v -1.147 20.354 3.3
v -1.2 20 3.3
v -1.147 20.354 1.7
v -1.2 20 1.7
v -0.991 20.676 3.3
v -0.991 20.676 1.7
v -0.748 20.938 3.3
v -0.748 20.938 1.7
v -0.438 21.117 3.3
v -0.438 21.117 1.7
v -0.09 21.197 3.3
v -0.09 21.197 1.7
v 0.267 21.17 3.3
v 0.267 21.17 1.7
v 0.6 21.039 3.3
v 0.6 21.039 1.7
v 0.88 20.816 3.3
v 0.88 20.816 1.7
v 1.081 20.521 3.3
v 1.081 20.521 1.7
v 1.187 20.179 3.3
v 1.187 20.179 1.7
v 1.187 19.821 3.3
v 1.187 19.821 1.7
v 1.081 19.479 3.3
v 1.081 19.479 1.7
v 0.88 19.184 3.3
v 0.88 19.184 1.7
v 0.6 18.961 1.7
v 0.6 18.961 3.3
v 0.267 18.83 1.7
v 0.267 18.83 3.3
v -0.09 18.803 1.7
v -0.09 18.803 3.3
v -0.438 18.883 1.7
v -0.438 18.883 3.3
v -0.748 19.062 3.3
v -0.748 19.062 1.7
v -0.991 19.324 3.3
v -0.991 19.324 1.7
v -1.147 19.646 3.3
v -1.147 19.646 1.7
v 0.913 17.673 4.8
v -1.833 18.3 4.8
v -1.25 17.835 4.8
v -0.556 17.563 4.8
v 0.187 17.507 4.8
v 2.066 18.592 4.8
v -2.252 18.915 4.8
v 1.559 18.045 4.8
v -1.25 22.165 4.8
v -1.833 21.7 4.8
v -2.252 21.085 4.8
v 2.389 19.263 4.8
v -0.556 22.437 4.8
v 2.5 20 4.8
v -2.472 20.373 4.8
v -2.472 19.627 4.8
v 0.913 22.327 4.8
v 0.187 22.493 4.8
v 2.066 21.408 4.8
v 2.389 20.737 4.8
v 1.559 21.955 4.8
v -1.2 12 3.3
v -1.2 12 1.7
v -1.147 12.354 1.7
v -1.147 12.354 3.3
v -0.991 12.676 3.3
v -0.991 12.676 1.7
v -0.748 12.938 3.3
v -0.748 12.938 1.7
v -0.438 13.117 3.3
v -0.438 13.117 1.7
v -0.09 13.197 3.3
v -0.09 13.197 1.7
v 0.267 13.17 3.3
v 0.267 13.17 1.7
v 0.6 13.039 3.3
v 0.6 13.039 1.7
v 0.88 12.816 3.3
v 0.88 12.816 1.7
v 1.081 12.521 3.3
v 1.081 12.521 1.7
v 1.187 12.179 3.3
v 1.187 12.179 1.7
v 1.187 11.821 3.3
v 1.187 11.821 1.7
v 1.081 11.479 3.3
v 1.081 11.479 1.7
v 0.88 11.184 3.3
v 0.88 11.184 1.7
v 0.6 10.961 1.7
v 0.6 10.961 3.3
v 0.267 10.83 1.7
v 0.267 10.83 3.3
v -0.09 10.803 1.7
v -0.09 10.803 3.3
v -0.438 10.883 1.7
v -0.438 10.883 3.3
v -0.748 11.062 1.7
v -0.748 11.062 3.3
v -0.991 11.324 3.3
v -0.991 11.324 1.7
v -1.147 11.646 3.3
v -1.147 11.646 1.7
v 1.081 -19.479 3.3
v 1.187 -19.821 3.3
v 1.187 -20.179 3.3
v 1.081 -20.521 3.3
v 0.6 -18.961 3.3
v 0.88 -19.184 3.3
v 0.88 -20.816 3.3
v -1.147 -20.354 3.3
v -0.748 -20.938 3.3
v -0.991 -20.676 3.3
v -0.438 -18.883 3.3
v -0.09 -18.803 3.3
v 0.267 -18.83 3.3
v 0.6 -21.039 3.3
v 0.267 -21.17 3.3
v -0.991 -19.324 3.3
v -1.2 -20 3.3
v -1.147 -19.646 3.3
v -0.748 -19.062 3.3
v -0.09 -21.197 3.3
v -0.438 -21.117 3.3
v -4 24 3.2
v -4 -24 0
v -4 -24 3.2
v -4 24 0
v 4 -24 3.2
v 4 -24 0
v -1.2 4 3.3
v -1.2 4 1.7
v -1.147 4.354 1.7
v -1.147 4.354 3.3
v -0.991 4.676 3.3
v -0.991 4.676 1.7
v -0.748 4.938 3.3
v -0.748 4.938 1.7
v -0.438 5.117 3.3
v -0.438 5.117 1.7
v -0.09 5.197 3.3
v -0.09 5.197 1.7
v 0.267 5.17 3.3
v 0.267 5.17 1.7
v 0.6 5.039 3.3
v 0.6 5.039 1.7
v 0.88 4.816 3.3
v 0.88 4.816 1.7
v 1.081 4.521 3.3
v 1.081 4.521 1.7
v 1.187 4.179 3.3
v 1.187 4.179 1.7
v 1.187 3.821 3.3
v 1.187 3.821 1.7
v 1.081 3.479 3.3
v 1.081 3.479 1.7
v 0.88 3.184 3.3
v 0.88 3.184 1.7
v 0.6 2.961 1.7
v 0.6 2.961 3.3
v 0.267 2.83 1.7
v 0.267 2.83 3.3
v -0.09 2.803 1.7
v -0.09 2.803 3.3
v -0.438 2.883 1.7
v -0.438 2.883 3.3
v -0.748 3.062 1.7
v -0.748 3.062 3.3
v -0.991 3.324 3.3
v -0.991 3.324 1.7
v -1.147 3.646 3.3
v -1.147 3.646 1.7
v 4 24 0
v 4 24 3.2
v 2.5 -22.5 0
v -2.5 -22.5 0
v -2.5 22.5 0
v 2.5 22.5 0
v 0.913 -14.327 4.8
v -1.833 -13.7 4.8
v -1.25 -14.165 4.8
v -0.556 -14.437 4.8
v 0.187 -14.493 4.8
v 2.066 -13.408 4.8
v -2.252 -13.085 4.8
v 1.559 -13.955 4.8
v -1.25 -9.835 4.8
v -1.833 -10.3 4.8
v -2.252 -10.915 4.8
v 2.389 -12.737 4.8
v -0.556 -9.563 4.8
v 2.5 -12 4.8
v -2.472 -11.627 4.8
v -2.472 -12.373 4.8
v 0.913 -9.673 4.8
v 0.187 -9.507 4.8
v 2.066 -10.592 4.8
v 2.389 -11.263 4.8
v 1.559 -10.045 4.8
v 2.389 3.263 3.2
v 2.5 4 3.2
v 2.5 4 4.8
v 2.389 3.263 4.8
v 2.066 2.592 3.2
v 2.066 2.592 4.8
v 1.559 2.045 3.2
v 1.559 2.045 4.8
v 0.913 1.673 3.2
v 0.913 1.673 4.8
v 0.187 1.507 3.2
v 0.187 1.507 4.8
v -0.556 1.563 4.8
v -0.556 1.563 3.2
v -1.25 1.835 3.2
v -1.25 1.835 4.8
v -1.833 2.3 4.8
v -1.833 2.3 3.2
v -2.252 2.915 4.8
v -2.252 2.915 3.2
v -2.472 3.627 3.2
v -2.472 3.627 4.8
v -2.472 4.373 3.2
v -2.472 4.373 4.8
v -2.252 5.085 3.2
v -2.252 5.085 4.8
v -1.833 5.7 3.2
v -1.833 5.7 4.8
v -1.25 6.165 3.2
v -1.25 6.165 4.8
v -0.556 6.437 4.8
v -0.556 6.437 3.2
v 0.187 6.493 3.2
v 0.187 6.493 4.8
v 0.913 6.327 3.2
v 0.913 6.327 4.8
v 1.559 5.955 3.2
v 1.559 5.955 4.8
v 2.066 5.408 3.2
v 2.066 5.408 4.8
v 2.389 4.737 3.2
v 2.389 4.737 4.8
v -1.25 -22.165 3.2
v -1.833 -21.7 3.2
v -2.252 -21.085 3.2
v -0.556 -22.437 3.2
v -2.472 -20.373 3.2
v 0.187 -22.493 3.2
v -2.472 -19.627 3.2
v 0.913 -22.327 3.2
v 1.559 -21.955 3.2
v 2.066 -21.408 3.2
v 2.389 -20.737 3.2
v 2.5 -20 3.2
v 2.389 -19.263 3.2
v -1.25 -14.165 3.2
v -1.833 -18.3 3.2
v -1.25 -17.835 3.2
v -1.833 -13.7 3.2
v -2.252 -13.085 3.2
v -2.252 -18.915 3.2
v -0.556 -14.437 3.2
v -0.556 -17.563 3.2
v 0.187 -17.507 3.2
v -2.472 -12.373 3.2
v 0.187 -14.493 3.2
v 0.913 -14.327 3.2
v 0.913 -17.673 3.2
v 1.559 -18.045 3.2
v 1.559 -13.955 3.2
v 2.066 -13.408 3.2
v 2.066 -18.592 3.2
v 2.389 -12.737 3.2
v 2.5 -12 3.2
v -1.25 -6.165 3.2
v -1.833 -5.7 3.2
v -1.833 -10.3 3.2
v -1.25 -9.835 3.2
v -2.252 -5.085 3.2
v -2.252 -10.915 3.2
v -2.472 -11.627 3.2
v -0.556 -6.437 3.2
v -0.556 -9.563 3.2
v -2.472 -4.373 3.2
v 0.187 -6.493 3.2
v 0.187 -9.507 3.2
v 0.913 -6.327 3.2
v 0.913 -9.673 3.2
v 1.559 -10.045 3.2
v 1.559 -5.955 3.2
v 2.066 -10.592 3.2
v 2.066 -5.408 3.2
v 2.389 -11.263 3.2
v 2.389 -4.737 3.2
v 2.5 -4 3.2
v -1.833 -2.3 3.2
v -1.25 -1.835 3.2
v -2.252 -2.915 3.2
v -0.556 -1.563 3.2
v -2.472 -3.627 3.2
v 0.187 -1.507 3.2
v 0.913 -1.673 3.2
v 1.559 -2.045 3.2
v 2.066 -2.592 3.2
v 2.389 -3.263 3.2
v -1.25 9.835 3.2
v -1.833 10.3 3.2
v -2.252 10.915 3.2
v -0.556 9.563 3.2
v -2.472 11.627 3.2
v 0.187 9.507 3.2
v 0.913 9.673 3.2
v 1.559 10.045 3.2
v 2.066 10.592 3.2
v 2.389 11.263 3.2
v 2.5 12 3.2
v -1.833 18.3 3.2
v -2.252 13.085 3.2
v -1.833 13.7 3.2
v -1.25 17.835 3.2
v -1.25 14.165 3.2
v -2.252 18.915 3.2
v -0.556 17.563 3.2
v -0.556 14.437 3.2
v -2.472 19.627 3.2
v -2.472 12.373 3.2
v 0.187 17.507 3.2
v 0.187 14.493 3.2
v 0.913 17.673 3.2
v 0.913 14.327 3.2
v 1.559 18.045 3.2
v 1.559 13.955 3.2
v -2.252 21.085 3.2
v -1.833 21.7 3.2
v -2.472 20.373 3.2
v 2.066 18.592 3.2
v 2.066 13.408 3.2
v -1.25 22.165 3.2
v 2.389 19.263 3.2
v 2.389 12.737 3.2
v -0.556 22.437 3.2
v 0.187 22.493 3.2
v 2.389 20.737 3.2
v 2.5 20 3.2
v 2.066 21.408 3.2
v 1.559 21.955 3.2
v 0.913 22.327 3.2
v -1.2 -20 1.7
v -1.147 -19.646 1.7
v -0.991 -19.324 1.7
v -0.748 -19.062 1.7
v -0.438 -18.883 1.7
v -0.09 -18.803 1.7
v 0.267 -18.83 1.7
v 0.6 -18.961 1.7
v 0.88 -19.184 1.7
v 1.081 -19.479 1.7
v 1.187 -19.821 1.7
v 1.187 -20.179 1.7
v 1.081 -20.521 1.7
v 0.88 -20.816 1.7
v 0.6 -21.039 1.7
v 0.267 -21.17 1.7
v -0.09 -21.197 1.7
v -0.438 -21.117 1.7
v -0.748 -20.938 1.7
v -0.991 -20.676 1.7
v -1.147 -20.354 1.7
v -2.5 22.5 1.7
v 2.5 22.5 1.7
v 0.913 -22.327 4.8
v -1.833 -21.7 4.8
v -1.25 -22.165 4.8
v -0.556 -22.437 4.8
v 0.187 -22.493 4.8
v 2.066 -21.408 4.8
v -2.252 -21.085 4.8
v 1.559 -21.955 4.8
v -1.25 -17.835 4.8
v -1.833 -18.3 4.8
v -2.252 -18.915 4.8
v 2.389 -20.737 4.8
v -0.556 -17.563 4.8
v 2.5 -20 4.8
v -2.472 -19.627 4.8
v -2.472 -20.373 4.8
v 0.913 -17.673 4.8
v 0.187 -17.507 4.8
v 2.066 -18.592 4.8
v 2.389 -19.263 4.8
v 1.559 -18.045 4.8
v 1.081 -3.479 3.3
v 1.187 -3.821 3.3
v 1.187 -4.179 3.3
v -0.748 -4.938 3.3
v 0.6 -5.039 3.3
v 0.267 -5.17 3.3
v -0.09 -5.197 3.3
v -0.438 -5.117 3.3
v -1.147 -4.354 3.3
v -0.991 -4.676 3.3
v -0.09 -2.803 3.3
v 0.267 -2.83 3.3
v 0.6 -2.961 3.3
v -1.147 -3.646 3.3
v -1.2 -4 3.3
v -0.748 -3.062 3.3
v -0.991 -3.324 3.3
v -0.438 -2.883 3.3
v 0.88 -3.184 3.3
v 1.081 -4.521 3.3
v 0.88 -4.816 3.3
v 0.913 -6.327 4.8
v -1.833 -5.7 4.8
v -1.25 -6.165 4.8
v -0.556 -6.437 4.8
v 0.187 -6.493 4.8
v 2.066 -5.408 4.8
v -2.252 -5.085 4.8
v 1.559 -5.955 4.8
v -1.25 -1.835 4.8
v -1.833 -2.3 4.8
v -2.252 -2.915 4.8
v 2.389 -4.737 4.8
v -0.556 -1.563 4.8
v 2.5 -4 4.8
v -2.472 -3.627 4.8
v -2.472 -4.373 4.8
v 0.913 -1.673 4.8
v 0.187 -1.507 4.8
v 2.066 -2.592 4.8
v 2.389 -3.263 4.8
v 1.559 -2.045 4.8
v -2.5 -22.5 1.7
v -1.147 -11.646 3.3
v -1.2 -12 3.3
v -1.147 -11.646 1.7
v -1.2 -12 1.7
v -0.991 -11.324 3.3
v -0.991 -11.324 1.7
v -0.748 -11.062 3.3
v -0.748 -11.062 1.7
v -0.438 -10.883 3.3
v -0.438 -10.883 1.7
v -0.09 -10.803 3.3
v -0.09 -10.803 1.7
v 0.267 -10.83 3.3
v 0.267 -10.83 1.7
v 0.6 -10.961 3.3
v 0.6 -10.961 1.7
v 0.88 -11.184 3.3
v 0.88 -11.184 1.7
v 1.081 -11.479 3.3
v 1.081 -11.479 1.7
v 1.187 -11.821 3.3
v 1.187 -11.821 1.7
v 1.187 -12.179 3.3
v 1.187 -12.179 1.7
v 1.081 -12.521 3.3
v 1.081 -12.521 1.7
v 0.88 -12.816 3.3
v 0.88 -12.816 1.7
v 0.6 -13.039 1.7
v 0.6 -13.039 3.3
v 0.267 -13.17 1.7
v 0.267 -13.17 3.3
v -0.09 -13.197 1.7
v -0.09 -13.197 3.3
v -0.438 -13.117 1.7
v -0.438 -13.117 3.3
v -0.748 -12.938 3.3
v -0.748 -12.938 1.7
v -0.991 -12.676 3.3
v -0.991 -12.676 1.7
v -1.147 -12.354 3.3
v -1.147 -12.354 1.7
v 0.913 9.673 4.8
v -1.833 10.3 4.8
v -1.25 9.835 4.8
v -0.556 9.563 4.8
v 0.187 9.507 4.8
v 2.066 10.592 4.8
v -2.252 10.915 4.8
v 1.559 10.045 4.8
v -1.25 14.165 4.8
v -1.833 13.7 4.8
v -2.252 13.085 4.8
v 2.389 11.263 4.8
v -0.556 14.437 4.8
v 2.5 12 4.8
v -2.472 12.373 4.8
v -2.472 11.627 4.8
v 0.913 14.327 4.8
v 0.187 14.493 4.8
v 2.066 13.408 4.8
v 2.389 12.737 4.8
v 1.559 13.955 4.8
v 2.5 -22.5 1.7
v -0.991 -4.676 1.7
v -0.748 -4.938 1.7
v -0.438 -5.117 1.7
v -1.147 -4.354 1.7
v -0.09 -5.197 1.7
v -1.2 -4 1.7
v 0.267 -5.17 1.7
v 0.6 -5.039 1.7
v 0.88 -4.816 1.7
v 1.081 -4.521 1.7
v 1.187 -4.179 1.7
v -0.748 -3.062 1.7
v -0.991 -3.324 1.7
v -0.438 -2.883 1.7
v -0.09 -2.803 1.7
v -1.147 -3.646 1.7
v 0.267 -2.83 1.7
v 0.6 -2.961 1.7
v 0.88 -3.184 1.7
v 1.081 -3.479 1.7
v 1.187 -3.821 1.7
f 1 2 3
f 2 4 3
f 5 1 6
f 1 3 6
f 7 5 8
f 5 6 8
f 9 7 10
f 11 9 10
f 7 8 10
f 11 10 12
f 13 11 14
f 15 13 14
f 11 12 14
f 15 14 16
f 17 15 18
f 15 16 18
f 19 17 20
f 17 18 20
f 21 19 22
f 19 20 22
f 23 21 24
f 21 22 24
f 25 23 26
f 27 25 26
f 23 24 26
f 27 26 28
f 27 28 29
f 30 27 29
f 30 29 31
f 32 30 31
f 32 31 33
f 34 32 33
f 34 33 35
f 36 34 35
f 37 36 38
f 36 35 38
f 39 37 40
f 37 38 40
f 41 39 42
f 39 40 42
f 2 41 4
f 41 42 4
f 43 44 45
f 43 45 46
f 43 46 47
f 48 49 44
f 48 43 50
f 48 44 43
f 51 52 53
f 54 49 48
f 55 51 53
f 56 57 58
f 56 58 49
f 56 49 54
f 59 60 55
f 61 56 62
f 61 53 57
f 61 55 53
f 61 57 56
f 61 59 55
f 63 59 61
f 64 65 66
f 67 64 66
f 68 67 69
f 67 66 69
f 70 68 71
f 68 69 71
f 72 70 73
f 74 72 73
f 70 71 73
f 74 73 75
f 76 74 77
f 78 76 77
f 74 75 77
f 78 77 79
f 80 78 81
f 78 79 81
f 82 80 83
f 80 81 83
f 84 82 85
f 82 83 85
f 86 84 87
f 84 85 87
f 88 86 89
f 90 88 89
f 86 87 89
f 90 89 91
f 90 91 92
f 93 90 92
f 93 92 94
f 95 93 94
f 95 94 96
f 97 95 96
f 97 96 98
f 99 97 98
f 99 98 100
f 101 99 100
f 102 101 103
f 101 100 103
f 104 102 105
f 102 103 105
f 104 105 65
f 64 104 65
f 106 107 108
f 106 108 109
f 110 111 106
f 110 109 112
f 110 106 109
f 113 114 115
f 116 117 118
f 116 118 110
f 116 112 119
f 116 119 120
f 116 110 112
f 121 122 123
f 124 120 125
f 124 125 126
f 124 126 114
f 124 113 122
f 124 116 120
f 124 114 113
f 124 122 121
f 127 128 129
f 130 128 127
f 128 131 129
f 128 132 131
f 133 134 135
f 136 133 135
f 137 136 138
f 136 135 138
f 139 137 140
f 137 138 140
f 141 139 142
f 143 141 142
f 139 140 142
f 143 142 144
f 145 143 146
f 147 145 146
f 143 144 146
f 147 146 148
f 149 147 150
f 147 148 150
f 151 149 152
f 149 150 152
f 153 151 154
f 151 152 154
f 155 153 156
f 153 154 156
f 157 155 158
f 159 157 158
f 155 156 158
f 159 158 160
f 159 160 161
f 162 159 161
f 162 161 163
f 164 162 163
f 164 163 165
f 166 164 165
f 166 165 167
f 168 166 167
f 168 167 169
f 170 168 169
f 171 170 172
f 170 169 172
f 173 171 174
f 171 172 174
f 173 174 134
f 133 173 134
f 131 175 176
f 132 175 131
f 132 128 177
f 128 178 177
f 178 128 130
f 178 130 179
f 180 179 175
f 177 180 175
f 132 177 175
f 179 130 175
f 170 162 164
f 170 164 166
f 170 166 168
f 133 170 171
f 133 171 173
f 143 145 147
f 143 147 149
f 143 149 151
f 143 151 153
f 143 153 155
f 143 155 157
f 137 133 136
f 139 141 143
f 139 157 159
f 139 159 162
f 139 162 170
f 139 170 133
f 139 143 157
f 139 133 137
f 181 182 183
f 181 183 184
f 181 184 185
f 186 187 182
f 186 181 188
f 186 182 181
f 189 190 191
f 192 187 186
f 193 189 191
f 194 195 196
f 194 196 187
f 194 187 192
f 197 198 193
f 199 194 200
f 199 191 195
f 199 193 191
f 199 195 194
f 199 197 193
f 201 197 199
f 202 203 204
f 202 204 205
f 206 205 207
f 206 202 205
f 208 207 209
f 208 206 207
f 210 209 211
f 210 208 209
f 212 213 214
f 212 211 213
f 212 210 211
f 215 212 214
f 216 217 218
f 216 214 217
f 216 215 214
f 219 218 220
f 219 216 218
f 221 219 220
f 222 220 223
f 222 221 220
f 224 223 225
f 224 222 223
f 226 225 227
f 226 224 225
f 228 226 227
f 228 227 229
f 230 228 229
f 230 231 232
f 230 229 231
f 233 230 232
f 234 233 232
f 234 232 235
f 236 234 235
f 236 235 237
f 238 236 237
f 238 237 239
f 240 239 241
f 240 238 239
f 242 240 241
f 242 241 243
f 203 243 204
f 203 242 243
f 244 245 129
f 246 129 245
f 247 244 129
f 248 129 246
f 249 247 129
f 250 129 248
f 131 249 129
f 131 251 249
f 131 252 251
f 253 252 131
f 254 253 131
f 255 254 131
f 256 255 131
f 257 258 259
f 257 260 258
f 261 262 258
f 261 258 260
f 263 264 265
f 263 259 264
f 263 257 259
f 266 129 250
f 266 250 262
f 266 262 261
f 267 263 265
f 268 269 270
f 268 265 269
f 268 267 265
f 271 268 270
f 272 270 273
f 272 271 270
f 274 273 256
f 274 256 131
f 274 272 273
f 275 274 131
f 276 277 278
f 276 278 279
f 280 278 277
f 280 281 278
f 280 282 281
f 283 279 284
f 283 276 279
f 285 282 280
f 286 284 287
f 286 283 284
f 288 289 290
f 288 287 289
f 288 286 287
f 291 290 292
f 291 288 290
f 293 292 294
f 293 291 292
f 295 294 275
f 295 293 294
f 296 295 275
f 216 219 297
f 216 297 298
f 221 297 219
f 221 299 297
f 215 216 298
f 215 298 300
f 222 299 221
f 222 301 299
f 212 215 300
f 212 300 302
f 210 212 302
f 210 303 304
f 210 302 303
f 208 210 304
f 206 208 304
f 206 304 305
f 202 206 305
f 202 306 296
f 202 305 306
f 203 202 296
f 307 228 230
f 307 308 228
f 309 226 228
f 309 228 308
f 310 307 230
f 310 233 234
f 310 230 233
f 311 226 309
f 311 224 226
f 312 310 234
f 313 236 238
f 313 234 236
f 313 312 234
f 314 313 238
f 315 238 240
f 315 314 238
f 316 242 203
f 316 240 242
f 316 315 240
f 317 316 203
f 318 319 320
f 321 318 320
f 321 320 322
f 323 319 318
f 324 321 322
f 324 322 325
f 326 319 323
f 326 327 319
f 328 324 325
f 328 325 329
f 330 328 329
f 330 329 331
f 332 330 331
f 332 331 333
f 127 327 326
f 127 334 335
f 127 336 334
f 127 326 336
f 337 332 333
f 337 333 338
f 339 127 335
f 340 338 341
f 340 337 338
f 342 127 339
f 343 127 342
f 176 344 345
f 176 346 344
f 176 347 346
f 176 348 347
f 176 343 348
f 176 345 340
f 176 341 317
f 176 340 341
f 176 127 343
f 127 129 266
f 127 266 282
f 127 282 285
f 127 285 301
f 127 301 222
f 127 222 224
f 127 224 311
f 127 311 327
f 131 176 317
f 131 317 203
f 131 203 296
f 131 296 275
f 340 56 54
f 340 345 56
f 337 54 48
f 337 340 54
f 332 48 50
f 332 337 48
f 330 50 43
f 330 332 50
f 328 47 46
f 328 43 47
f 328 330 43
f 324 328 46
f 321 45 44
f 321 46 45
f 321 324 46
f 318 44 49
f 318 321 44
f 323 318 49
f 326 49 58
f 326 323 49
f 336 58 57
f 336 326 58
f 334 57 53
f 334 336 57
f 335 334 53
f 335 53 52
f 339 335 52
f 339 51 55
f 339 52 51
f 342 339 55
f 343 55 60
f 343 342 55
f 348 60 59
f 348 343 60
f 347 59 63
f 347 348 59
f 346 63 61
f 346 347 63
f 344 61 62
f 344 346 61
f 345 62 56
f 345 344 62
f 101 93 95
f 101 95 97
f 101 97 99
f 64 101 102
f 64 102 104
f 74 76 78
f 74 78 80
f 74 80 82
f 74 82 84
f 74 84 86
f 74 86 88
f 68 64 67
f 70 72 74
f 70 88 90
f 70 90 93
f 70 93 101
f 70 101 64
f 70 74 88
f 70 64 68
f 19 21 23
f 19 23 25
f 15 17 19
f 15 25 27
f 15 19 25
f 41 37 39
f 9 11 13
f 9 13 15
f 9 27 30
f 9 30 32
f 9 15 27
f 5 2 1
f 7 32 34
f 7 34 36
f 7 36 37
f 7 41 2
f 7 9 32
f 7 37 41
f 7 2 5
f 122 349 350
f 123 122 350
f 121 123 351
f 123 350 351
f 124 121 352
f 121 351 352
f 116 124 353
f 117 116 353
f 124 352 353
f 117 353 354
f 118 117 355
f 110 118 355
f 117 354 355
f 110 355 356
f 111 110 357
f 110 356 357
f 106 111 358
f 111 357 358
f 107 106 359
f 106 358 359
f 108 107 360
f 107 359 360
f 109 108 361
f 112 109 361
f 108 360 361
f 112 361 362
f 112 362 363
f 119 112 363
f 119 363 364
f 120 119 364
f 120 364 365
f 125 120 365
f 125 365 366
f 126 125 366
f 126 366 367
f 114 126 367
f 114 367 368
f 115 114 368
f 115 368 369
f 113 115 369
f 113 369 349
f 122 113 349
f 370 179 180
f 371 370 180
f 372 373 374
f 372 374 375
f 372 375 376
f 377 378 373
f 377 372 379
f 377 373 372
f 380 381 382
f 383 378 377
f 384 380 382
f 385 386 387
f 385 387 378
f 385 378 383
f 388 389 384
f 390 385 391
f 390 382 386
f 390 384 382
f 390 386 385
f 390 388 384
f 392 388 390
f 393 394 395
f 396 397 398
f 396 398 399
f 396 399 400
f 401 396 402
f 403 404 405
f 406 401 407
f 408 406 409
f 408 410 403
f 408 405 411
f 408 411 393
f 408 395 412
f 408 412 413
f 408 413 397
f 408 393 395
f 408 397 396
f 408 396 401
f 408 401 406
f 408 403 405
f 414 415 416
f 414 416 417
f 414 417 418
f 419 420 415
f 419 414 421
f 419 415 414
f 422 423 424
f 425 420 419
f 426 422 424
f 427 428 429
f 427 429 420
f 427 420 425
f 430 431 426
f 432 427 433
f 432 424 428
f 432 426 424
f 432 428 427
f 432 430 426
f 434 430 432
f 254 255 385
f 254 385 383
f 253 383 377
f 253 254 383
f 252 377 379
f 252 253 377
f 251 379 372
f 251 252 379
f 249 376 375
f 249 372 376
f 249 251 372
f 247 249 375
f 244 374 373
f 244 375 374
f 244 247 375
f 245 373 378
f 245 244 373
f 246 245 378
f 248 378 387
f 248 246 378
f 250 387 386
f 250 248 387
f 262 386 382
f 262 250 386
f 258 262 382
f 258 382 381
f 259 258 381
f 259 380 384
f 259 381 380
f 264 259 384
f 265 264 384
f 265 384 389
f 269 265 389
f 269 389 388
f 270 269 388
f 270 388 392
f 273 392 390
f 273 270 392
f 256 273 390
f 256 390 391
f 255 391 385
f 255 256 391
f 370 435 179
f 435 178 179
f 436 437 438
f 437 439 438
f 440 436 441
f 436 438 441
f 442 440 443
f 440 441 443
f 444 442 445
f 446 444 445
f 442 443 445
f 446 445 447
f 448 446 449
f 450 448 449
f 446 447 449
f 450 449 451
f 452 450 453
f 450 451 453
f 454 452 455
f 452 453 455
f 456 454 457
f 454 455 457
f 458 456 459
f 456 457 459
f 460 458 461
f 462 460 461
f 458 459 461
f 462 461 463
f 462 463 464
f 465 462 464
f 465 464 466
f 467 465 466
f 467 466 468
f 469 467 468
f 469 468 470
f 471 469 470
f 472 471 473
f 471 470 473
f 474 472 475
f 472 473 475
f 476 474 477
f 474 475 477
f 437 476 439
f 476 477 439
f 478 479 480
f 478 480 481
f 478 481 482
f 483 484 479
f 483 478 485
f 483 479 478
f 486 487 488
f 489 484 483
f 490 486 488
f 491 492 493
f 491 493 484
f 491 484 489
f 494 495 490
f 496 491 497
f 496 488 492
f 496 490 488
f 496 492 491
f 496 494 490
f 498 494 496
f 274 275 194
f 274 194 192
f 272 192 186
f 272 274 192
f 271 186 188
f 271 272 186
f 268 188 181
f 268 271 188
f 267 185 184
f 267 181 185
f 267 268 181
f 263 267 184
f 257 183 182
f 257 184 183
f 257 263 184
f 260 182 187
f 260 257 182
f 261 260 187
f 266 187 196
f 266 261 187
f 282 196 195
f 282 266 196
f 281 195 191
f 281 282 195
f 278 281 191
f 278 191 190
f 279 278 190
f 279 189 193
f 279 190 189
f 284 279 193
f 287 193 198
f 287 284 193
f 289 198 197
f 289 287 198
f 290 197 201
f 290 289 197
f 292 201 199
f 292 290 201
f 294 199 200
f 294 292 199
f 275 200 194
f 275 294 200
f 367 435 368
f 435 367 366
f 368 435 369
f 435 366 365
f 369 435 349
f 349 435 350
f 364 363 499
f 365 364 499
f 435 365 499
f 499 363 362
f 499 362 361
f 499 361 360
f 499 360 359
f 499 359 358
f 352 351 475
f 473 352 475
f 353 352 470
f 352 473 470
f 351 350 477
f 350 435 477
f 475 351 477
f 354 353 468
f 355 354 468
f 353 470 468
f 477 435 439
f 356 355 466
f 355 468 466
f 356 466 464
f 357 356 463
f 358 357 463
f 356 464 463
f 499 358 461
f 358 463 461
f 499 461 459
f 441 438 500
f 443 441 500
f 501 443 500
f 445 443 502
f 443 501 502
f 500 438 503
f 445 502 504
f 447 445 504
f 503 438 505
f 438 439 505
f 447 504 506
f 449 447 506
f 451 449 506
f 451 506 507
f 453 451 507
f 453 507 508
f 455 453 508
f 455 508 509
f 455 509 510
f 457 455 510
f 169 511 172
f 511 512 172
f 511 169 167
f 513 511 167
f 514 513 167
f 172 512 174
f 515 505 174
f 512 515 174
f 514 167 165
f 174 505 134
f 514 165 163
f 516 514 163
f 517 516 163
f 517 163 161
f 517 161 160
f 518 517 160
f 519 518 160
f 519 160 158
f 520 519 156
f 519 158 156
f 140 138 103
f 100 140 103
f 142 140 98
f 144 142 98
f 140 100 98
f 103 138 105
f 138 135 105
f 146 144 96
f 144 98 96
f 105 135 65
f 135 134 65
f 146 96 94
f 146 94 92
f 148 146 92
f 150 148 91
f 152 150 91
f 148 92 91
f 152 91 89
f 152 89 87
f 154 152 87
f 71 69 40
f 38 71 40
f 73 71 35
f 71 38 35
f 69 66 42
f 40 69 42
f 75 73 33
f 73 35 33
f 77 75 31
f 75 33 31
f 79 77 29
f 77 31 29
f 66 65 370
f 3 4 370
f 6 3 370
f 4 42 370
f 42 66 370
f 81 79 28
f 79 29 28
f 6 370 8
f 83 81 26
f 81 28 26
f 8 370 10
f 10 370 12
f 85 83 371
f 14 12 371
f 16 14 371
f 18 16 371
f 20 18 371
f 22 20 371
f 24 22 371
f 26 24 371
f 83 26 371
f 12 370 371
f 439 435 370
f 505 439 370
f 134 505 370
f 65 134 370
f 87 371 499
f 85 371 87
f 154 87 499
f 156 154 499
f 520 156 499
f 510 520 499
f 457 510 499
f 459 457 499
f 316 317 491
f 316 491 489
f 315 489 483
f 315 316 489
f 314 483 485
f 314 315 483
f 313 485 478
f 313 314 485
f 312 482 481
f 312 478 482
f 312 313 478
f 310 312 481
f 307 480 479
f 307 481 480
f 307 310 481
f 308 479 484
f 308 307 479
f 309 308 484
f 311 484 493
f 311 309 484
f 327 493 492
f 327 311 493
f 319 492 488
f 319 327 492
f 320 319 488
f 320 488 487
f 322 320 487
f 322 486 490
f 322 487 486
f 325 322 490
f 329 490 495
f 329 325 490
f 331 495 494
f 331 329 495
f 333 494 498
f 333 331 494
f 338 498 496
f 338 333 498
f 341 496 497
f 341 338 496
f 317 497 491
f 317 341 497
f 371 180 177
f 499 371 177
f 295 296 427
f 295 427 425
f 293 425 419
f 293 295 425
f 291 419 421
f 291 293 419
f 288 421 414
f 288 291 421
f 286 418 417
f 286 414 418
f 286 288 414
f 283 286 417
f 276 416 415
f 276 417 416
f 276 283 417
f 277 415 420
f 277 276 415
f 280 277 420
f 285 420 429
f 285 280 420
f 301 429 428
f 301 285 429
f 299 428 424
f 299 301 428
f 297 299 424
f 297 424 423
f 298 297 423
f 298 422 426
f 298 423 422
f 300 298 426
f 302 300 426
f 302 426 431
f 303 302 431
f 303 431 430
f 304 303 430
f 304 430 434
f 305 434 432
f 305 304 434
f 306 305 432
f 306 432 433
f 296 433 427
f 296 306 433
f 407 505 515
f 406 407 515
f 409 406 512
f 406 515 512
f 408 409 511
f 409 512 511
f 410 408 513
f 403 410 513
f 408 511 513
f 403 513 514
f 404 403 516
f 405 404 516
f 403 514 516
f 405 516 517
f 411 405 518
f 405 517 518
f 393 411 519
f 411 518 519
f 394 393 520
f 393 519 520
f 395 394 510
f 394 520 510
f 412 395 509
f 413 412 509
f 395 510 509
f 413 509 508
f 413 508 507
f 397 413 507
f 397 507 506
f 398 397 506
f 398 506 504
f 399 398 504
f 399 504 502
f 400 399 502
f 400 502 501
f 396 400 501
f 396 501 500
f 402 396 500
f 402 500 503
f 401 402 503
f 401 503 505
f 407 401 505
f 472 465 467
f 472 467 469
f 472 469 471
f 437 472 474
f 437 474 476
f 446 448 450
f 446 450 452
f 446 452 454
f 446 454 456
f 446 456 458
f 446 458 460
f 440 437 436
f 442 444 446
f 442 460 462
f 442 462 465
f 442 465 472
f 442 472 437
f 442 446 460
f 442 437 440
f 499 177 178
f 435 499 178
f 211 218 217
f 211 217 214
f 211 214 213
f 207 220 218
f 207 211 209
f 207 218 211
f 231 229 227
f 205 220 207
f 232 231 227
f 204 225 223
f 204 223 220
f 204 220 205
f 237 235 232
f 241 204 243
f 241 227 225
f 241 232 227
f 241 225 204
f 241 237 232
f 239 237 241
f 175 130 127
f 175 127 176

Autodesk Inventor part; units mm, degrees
ref_plane "YZ Plane" through (0, 0, 0) normal (1, 0, 0) x (0, 1, 0)
ref_plane "XZ Plane" through (0, 0, 0) normal (0, 1, 0) x (-1, 0, 0)
ref_plane "XY Plane" through (0, 0, 0) normal (0, 0, 1) x (1, 0, 0)
sketch "Sketch1" plane through (0, 0, 0) normal (0, 0, 1) x (1, 0, 0)
  line L0 (-4, 24) -> (4, 24)
  line L1 (4, 24) -> (4, -24)
  line L2 (4, -24) -> (-4, -24)
  line L3 (-4, -24) -> (-4, 24)
  point P0 (0, 0)
  dimension "d0" = 8
  dimension "d1" = 48
  dimension "d2" = 4
  dimension "d3" = 24
extrude "Extrusion1" add sketch "Sketch1" along normal blind 3.2
shell "Shell1" thickness 1.5 removed faces 1 at (-1.3333, 8, 0)
sketch "Sketch2" plane through (0, 0, 3.2) normal (0, 0, 1) x (1, 0, 0)
  circle A0 centre (0, -20) radius 2.5
  line L0 (4, 24) -> (4, -24) projected
  line L1 (4, -24) -> (-4, -24) projected
  dimension "d7" = 5
  dimension "d10" = 4
  dimension "d11" = 4
extrude "Extrusion2" add sketch "Sketch2" along normal blind 1.6
sketch "Sketch3" plane through (2.5, -22.5, 1.7) normal (0, 0, -1) x (-1, 0, 0)
  circle A0 centre (2.5, 2.5) radius 2.5 projected
  circle A1 centre (2.5, 2.5) radius 1.2
  point P0 (2.5, 22.5)
  dimension "d18" = 2.4
extrude "Extrusion3" cut sketch "Sketch3" against normal blind 1.6 contours A1
pattern_linear "Rectangular Pattern1" count 6 spacing 8 along (0, 1, 0) of "Extrusion2", "Extrusion3"
sketch "Sketch4" plane through (2.5, -22.5, 1.7) normal (0, 0, -1) x (-1, 0, 0)
  circle A0 centre (2.5, 10.5) radius 1.2 projected
  circle A1 centre (2.5, 2.5) radius 1.2 projected
  line L0 (0, 45) -> (0, 0) projected
  line L1 (0, 0) -> (5, 0) projected
  circle A2 centre (6.5, 6.5) radius 3.15
  circle A3 centre (6.5, 6.5) radius 2.5
  point P0 (2.5, 22.5)
  dimension "d21" = 6.5
  dimension "d22" = 6.5
  dimension "d23" = 10.5
  dimension "d24" = 2.5
  dimension "d25" = 5
  dimension "d26" = 6.3
extrude "Extrusion4" [suppressed]
pattern_linear "Rectangular Pattern2" [suppressed]
equation "\"d0\" = 8 * WIDTH"
equation "\"d1\" = 8 * LENGTH"
equation "\"d2\" = 0.5 * d0"
equation "\"d3\" = 0.5 * d1"
equation "\"d4\" = HEIGHT"
equation "\"d21\" = 0.5 * d23 + 0.5 * d24"
equation "\"d22\" = d21"
equation "\"WIDTH\" = 1"
equation "\"HEIGHT\" = 3.2"
equation "\"LENGTH\" = 6"
properties part number "3666" material "Steel"
